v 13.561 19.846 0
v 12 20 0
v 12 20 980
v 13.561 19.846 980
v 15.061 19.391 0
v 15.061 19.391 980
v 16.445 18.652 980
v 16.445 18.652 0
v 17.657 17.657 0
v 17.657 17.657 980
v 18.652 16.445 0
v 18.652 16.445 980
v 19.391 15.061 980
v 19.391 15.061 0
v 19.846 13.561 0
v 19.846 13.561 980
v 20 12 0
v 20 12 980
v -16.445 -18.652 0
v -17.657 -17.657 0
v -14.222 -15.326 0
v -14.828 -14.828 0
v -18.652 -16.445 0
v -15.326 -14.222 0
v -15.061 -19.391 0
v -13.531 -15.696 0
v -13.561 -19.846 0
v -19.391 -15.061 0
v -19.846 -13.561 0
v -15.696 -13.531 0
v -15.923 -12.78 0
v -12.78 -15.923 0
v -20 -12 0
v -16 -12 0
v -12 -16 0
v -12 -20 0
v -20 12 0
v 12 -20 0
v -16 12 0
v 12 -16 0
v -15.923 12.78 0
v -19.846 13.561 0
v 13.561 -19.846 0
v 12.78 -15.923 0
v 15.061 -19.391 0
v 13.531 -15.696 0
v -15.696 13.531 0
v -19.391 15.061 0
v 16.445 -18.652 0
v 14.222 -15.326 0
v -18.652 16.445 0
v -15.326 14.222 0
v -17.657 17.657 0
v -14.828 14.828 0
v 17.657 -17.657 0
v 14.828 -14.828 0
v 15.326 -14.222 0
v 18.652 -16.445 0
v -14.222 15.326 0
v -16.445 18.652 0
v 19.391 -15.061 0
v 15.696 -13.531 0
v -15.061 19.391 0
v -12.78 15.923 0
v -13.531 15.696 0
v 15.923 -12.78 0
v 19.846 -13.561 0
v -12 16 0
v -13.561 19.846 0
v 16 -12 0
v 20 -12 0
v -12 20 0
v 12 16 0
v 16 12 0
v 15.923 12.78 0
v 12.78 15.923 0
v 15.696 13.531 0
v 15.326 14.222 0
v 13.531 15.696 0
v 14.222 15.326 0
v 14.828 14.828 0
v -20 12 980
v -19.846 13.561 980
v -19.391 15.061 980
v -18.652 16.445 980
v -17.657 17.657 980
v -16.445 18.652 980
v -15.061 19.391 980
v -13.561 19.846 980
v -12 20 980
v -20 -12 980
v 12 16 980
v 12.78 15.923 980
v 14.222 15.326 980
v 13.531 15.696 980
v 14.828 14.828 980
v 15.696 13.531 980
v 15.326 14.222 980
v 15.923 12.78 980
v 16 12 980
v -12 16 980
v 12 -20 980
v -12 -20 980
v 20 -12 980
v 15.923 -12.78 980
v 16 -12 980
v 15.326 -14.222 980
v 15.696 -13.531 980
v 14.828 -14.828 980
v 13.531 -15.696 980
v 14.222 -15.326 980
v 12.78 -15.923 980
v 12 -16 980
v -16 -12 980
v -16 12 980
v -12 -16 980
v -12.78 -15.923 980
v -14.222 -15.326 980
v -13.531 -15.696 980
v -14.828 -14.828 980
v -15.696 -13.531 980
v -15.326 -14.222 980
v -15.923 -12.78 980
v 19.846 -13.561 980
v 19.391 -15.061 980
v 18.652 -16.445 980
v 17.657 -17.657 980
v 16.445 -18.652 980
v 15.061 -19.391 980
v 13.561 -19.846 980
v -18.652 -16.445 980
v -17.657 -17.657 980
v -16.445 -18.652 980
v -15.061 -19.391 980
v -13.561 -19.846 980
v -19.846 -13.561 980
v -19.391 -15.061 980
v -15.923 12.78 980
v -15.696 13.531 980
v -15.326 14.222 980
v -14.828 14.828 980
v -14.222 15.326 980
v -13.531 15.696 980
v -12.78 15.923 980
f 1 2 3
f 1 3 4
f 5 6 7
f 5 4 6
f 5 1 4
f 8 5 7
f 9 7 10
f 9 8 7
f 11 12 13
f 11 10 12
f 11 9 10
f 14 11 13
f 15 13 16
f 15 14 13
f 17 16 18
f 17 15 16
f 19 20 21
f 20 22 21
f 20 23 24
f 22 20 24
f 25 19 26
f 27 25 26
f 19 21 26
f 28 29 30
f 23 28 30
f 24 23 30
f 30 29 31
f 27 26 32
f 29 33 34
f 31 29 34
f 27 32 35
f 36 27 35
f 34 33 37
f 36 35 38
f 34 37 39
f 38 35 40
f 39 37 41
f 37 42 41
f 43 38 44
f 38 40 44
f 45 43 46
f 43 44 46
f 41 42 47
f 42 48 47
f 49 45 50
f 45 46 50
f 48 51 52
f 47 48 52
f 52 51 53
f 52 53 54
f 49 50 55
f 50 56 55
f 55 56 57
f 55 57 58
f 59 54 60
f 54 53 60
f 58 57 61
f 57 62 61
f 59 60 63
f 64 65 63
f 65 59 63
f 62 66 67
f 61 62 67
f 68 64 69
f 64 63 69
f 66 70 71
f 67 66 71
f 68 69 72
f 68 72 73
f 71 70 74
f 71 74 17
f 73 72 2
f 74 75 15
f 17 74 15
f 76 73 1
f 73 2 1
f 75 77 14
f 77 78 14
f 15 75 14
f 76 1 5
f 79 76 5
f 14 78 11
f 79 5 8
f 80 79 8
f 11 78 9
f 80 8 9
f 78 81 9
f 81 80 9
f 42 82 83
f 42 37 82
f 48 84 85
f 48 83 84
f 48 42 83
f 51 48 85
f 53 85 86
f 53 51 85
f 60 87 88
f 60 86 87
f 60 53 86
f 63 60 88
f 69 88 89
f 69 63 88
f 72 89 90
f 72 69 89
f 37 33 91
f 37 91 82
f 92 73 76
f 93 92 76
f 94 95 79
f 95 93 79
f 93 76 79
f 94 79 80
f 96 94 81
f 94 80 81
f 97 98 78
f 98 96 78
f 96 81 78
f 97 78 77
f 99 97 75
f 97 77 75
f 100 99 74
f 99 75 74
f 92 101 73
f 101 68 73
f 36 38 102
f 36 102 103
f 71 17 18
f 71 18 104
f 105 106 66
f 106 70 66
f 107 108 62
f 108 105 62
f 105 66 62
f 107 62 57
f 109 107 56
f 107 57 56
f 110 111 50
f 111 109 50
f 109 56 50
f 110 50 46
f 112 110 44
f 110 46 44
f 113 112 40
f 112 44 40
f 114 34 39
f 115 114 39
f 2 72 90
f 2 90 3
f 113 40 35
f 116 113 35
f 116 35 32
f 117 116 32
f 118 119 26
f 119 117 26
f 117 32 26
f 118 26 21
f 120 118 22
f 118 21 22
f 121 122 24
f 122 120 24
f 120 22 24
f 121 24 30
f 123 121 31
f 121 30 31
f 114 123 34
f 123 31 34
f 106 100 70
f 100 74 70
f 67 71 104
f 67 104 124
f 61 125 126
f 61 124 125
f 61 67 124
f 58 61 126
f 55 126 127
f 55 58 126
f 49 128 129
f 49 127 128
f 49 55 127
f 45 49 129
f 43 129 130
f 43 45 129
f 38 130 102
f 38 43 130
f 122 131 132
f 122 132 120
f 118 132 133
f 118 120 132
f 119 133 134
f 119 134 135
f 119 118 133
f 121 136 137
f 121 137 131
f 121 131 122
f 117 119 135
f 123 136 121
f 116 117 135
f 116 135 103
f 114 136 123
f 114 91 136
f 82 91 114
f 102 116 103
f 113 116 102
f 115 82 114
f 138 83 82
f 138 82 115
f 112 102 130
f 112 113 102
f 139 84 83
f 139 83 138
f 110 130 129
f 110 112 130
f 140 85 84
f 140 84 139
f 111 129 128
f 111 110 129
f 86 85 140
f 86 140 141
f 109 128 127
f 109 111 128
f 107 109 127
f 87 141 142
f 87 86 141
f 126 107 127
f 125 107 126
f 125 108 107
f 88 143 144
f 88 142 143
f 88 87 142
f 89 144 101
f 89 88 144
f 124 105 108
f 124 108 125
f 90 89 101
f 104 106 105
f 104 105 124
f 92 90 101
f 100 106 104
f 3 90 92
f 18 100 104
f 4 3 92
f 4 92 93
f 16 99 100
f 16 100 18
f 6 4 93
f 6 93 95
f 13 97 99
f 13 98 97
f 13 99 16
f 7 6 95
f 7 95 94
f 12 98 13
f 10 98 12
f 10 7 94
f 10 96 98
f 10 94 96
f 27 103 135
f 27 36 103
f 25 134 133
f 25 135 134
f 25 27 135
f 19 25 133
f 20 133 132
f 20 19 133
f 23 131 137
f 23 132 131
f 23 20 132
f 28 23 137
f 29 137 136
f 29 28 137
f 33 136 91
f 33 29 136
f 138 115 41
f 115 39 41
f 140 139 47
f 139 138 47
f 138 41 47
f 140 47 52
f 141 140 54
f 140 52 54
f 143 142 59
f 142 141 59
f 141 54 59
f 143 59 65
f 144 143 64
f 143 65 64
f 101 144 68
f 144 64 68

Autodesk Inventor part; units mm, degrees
ref_plane "Start plane" through (0, 0, 0) normal (0, 0, 1) x (1, 0, 0)
ref_plane "End plane" through (0, 0, 980) normal (0, 0, 1) x (1, 0, 0)
sketch "Sketch" plane through (0, 0, 0) normal (0, 0, 1) x (1, 0, 0)
  line L0 (-20, -12) -> (-20, 12)
  line L1 (-12, 20) -> (12, 20)
  line L2 (20, 12) -> (20, -12)
  line L3 (12, -20) -> (-12, -20)
  arc A0 (-20, -12) -> (-12, -20) centre (-12, -12) ccw
  arc A1 (-12, 20) -> (-20, 12) centre (-12, 12) ccw
  arc A2 (20, 12) -> (12, 20) centre (12, 12) ccw
  arc A3 (12, -20) -> (20, -12) centre (12, -12) ccw
  arc A4 (-12, 16) -> (-16, 12) centre (-12, 12) ccw
  line L4 (-12, 16) -> (12, 16)
  arc A5 (16, 12) -> (12, 16) centre (12, 12) ccw
  line L5 (16, 12) -> (16, -12)
  arc A6 (12, -16) -> (16, -12) centre (12, -12) ccw
  line L6 (12, -16) -> (-12, -16)
  arc A7 (-16, -12) -> (-12, -16) centre (-12, -12) ccw
  line L7 (-16, -12) -> (-16, 12)
  line L8 (0, 30.3196) -> (0, -30.3196) construction
  line L9 (-30.3196, 0) -> (30.3196, 0) construction
  dimension "d7" = 8
  dimension "d10" = 40
  dimension "d11" = 40
  dimension "d12" = 4
  dimension "d15" = 20
  dimension "d16" = 20
extrude "Body" add sketch "Sketch" along normal up to surface (980 mm away) from surface at 0
sketch "Sketch3" plane through (0, 0, 0) normal (0, 0, 1) x (1, 0, 0)
  line L0 (0, 0) -> (10, 0)
ref_plane "Work Plane3" through (0, 0, 0) normal (0, -1, 0) x (1, 0, 0)
sketch "Sketch4" plane through (0, 0, 0) normal (0, -1, 0) x (1, 0, 0)
  line L0 (-2, 0) -> (12, 0)
  line L1 (-2, 980) -> (12, 980)
  dimension "d18" = 980
ref_plane "Work Plane4" through (12, -900, 1020) normal (0, 0, 1) x (1, 0, 0)
split "Split1" plane through (12, -900, 1020) removes the side toward (0, 0, 1)
ref_plane "Work Plane5" through (-12, -900, 980) normal (0, 0, 1) x (1, 0, 0)
split "Split2" plane through (-12, -900, 980) removes the side toward (0, 0, 1)
equation "\"d7\" = G_IR"
equation "\"d10\" = G_H"
equation "\"d11\" = G_W"
equation "\"d12\" = G_T"
equation "\"d15\" = 0.5 * d10"
equation "\"d16\" = 0.5 * d11"
equation "\"d3\" = G_L"
equation "\"G_W\" = 40"
equation "\"G_H\" = 40"
equation "\"G_T\" = 4"
equation "\"G_IR\" = 8"
equation "\"G_L\" = d18"
equation "\"G_OFFSET_START\" = 0"
equation "\"G_OFFSET_END\" = -20"
equation "\"d14\" = G_OFFSET_END + B_L"
equation "\"B_L\" = 1000"
properties part number "DIN EN 10219-2 - 40 x 40 x 4  - 980" material "Steel, Mild"
